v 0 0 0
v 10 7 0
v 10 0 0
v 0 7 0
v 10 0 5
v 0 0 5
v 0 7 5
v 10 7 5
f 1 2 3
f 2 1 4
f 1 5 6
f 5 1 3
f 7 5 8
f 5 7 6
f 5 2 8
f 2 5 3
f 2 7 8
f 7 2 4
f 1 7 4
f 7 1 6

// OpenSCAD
CubePoints = [
  [  0,  0,  0 ],
  [ 10,  0,  0 ],
  [ 10,  7,  0 ],
  [  0,  7,  0 ],
  [  0,  0,  5 ],
  [ 10,  0,  5 ],
  [ 10,  7,  5 ],
  [  0,  7,  5 ]];
  
CubeFaces = [
  [0,1,2,3],
  [4,5,1,0],
  [7,6,5,4],
  [5,6,2,1],
  [6,7,3,2],
  [7,4,0,3]];
  
polyhedron( CubePoints, CubeFaces );
